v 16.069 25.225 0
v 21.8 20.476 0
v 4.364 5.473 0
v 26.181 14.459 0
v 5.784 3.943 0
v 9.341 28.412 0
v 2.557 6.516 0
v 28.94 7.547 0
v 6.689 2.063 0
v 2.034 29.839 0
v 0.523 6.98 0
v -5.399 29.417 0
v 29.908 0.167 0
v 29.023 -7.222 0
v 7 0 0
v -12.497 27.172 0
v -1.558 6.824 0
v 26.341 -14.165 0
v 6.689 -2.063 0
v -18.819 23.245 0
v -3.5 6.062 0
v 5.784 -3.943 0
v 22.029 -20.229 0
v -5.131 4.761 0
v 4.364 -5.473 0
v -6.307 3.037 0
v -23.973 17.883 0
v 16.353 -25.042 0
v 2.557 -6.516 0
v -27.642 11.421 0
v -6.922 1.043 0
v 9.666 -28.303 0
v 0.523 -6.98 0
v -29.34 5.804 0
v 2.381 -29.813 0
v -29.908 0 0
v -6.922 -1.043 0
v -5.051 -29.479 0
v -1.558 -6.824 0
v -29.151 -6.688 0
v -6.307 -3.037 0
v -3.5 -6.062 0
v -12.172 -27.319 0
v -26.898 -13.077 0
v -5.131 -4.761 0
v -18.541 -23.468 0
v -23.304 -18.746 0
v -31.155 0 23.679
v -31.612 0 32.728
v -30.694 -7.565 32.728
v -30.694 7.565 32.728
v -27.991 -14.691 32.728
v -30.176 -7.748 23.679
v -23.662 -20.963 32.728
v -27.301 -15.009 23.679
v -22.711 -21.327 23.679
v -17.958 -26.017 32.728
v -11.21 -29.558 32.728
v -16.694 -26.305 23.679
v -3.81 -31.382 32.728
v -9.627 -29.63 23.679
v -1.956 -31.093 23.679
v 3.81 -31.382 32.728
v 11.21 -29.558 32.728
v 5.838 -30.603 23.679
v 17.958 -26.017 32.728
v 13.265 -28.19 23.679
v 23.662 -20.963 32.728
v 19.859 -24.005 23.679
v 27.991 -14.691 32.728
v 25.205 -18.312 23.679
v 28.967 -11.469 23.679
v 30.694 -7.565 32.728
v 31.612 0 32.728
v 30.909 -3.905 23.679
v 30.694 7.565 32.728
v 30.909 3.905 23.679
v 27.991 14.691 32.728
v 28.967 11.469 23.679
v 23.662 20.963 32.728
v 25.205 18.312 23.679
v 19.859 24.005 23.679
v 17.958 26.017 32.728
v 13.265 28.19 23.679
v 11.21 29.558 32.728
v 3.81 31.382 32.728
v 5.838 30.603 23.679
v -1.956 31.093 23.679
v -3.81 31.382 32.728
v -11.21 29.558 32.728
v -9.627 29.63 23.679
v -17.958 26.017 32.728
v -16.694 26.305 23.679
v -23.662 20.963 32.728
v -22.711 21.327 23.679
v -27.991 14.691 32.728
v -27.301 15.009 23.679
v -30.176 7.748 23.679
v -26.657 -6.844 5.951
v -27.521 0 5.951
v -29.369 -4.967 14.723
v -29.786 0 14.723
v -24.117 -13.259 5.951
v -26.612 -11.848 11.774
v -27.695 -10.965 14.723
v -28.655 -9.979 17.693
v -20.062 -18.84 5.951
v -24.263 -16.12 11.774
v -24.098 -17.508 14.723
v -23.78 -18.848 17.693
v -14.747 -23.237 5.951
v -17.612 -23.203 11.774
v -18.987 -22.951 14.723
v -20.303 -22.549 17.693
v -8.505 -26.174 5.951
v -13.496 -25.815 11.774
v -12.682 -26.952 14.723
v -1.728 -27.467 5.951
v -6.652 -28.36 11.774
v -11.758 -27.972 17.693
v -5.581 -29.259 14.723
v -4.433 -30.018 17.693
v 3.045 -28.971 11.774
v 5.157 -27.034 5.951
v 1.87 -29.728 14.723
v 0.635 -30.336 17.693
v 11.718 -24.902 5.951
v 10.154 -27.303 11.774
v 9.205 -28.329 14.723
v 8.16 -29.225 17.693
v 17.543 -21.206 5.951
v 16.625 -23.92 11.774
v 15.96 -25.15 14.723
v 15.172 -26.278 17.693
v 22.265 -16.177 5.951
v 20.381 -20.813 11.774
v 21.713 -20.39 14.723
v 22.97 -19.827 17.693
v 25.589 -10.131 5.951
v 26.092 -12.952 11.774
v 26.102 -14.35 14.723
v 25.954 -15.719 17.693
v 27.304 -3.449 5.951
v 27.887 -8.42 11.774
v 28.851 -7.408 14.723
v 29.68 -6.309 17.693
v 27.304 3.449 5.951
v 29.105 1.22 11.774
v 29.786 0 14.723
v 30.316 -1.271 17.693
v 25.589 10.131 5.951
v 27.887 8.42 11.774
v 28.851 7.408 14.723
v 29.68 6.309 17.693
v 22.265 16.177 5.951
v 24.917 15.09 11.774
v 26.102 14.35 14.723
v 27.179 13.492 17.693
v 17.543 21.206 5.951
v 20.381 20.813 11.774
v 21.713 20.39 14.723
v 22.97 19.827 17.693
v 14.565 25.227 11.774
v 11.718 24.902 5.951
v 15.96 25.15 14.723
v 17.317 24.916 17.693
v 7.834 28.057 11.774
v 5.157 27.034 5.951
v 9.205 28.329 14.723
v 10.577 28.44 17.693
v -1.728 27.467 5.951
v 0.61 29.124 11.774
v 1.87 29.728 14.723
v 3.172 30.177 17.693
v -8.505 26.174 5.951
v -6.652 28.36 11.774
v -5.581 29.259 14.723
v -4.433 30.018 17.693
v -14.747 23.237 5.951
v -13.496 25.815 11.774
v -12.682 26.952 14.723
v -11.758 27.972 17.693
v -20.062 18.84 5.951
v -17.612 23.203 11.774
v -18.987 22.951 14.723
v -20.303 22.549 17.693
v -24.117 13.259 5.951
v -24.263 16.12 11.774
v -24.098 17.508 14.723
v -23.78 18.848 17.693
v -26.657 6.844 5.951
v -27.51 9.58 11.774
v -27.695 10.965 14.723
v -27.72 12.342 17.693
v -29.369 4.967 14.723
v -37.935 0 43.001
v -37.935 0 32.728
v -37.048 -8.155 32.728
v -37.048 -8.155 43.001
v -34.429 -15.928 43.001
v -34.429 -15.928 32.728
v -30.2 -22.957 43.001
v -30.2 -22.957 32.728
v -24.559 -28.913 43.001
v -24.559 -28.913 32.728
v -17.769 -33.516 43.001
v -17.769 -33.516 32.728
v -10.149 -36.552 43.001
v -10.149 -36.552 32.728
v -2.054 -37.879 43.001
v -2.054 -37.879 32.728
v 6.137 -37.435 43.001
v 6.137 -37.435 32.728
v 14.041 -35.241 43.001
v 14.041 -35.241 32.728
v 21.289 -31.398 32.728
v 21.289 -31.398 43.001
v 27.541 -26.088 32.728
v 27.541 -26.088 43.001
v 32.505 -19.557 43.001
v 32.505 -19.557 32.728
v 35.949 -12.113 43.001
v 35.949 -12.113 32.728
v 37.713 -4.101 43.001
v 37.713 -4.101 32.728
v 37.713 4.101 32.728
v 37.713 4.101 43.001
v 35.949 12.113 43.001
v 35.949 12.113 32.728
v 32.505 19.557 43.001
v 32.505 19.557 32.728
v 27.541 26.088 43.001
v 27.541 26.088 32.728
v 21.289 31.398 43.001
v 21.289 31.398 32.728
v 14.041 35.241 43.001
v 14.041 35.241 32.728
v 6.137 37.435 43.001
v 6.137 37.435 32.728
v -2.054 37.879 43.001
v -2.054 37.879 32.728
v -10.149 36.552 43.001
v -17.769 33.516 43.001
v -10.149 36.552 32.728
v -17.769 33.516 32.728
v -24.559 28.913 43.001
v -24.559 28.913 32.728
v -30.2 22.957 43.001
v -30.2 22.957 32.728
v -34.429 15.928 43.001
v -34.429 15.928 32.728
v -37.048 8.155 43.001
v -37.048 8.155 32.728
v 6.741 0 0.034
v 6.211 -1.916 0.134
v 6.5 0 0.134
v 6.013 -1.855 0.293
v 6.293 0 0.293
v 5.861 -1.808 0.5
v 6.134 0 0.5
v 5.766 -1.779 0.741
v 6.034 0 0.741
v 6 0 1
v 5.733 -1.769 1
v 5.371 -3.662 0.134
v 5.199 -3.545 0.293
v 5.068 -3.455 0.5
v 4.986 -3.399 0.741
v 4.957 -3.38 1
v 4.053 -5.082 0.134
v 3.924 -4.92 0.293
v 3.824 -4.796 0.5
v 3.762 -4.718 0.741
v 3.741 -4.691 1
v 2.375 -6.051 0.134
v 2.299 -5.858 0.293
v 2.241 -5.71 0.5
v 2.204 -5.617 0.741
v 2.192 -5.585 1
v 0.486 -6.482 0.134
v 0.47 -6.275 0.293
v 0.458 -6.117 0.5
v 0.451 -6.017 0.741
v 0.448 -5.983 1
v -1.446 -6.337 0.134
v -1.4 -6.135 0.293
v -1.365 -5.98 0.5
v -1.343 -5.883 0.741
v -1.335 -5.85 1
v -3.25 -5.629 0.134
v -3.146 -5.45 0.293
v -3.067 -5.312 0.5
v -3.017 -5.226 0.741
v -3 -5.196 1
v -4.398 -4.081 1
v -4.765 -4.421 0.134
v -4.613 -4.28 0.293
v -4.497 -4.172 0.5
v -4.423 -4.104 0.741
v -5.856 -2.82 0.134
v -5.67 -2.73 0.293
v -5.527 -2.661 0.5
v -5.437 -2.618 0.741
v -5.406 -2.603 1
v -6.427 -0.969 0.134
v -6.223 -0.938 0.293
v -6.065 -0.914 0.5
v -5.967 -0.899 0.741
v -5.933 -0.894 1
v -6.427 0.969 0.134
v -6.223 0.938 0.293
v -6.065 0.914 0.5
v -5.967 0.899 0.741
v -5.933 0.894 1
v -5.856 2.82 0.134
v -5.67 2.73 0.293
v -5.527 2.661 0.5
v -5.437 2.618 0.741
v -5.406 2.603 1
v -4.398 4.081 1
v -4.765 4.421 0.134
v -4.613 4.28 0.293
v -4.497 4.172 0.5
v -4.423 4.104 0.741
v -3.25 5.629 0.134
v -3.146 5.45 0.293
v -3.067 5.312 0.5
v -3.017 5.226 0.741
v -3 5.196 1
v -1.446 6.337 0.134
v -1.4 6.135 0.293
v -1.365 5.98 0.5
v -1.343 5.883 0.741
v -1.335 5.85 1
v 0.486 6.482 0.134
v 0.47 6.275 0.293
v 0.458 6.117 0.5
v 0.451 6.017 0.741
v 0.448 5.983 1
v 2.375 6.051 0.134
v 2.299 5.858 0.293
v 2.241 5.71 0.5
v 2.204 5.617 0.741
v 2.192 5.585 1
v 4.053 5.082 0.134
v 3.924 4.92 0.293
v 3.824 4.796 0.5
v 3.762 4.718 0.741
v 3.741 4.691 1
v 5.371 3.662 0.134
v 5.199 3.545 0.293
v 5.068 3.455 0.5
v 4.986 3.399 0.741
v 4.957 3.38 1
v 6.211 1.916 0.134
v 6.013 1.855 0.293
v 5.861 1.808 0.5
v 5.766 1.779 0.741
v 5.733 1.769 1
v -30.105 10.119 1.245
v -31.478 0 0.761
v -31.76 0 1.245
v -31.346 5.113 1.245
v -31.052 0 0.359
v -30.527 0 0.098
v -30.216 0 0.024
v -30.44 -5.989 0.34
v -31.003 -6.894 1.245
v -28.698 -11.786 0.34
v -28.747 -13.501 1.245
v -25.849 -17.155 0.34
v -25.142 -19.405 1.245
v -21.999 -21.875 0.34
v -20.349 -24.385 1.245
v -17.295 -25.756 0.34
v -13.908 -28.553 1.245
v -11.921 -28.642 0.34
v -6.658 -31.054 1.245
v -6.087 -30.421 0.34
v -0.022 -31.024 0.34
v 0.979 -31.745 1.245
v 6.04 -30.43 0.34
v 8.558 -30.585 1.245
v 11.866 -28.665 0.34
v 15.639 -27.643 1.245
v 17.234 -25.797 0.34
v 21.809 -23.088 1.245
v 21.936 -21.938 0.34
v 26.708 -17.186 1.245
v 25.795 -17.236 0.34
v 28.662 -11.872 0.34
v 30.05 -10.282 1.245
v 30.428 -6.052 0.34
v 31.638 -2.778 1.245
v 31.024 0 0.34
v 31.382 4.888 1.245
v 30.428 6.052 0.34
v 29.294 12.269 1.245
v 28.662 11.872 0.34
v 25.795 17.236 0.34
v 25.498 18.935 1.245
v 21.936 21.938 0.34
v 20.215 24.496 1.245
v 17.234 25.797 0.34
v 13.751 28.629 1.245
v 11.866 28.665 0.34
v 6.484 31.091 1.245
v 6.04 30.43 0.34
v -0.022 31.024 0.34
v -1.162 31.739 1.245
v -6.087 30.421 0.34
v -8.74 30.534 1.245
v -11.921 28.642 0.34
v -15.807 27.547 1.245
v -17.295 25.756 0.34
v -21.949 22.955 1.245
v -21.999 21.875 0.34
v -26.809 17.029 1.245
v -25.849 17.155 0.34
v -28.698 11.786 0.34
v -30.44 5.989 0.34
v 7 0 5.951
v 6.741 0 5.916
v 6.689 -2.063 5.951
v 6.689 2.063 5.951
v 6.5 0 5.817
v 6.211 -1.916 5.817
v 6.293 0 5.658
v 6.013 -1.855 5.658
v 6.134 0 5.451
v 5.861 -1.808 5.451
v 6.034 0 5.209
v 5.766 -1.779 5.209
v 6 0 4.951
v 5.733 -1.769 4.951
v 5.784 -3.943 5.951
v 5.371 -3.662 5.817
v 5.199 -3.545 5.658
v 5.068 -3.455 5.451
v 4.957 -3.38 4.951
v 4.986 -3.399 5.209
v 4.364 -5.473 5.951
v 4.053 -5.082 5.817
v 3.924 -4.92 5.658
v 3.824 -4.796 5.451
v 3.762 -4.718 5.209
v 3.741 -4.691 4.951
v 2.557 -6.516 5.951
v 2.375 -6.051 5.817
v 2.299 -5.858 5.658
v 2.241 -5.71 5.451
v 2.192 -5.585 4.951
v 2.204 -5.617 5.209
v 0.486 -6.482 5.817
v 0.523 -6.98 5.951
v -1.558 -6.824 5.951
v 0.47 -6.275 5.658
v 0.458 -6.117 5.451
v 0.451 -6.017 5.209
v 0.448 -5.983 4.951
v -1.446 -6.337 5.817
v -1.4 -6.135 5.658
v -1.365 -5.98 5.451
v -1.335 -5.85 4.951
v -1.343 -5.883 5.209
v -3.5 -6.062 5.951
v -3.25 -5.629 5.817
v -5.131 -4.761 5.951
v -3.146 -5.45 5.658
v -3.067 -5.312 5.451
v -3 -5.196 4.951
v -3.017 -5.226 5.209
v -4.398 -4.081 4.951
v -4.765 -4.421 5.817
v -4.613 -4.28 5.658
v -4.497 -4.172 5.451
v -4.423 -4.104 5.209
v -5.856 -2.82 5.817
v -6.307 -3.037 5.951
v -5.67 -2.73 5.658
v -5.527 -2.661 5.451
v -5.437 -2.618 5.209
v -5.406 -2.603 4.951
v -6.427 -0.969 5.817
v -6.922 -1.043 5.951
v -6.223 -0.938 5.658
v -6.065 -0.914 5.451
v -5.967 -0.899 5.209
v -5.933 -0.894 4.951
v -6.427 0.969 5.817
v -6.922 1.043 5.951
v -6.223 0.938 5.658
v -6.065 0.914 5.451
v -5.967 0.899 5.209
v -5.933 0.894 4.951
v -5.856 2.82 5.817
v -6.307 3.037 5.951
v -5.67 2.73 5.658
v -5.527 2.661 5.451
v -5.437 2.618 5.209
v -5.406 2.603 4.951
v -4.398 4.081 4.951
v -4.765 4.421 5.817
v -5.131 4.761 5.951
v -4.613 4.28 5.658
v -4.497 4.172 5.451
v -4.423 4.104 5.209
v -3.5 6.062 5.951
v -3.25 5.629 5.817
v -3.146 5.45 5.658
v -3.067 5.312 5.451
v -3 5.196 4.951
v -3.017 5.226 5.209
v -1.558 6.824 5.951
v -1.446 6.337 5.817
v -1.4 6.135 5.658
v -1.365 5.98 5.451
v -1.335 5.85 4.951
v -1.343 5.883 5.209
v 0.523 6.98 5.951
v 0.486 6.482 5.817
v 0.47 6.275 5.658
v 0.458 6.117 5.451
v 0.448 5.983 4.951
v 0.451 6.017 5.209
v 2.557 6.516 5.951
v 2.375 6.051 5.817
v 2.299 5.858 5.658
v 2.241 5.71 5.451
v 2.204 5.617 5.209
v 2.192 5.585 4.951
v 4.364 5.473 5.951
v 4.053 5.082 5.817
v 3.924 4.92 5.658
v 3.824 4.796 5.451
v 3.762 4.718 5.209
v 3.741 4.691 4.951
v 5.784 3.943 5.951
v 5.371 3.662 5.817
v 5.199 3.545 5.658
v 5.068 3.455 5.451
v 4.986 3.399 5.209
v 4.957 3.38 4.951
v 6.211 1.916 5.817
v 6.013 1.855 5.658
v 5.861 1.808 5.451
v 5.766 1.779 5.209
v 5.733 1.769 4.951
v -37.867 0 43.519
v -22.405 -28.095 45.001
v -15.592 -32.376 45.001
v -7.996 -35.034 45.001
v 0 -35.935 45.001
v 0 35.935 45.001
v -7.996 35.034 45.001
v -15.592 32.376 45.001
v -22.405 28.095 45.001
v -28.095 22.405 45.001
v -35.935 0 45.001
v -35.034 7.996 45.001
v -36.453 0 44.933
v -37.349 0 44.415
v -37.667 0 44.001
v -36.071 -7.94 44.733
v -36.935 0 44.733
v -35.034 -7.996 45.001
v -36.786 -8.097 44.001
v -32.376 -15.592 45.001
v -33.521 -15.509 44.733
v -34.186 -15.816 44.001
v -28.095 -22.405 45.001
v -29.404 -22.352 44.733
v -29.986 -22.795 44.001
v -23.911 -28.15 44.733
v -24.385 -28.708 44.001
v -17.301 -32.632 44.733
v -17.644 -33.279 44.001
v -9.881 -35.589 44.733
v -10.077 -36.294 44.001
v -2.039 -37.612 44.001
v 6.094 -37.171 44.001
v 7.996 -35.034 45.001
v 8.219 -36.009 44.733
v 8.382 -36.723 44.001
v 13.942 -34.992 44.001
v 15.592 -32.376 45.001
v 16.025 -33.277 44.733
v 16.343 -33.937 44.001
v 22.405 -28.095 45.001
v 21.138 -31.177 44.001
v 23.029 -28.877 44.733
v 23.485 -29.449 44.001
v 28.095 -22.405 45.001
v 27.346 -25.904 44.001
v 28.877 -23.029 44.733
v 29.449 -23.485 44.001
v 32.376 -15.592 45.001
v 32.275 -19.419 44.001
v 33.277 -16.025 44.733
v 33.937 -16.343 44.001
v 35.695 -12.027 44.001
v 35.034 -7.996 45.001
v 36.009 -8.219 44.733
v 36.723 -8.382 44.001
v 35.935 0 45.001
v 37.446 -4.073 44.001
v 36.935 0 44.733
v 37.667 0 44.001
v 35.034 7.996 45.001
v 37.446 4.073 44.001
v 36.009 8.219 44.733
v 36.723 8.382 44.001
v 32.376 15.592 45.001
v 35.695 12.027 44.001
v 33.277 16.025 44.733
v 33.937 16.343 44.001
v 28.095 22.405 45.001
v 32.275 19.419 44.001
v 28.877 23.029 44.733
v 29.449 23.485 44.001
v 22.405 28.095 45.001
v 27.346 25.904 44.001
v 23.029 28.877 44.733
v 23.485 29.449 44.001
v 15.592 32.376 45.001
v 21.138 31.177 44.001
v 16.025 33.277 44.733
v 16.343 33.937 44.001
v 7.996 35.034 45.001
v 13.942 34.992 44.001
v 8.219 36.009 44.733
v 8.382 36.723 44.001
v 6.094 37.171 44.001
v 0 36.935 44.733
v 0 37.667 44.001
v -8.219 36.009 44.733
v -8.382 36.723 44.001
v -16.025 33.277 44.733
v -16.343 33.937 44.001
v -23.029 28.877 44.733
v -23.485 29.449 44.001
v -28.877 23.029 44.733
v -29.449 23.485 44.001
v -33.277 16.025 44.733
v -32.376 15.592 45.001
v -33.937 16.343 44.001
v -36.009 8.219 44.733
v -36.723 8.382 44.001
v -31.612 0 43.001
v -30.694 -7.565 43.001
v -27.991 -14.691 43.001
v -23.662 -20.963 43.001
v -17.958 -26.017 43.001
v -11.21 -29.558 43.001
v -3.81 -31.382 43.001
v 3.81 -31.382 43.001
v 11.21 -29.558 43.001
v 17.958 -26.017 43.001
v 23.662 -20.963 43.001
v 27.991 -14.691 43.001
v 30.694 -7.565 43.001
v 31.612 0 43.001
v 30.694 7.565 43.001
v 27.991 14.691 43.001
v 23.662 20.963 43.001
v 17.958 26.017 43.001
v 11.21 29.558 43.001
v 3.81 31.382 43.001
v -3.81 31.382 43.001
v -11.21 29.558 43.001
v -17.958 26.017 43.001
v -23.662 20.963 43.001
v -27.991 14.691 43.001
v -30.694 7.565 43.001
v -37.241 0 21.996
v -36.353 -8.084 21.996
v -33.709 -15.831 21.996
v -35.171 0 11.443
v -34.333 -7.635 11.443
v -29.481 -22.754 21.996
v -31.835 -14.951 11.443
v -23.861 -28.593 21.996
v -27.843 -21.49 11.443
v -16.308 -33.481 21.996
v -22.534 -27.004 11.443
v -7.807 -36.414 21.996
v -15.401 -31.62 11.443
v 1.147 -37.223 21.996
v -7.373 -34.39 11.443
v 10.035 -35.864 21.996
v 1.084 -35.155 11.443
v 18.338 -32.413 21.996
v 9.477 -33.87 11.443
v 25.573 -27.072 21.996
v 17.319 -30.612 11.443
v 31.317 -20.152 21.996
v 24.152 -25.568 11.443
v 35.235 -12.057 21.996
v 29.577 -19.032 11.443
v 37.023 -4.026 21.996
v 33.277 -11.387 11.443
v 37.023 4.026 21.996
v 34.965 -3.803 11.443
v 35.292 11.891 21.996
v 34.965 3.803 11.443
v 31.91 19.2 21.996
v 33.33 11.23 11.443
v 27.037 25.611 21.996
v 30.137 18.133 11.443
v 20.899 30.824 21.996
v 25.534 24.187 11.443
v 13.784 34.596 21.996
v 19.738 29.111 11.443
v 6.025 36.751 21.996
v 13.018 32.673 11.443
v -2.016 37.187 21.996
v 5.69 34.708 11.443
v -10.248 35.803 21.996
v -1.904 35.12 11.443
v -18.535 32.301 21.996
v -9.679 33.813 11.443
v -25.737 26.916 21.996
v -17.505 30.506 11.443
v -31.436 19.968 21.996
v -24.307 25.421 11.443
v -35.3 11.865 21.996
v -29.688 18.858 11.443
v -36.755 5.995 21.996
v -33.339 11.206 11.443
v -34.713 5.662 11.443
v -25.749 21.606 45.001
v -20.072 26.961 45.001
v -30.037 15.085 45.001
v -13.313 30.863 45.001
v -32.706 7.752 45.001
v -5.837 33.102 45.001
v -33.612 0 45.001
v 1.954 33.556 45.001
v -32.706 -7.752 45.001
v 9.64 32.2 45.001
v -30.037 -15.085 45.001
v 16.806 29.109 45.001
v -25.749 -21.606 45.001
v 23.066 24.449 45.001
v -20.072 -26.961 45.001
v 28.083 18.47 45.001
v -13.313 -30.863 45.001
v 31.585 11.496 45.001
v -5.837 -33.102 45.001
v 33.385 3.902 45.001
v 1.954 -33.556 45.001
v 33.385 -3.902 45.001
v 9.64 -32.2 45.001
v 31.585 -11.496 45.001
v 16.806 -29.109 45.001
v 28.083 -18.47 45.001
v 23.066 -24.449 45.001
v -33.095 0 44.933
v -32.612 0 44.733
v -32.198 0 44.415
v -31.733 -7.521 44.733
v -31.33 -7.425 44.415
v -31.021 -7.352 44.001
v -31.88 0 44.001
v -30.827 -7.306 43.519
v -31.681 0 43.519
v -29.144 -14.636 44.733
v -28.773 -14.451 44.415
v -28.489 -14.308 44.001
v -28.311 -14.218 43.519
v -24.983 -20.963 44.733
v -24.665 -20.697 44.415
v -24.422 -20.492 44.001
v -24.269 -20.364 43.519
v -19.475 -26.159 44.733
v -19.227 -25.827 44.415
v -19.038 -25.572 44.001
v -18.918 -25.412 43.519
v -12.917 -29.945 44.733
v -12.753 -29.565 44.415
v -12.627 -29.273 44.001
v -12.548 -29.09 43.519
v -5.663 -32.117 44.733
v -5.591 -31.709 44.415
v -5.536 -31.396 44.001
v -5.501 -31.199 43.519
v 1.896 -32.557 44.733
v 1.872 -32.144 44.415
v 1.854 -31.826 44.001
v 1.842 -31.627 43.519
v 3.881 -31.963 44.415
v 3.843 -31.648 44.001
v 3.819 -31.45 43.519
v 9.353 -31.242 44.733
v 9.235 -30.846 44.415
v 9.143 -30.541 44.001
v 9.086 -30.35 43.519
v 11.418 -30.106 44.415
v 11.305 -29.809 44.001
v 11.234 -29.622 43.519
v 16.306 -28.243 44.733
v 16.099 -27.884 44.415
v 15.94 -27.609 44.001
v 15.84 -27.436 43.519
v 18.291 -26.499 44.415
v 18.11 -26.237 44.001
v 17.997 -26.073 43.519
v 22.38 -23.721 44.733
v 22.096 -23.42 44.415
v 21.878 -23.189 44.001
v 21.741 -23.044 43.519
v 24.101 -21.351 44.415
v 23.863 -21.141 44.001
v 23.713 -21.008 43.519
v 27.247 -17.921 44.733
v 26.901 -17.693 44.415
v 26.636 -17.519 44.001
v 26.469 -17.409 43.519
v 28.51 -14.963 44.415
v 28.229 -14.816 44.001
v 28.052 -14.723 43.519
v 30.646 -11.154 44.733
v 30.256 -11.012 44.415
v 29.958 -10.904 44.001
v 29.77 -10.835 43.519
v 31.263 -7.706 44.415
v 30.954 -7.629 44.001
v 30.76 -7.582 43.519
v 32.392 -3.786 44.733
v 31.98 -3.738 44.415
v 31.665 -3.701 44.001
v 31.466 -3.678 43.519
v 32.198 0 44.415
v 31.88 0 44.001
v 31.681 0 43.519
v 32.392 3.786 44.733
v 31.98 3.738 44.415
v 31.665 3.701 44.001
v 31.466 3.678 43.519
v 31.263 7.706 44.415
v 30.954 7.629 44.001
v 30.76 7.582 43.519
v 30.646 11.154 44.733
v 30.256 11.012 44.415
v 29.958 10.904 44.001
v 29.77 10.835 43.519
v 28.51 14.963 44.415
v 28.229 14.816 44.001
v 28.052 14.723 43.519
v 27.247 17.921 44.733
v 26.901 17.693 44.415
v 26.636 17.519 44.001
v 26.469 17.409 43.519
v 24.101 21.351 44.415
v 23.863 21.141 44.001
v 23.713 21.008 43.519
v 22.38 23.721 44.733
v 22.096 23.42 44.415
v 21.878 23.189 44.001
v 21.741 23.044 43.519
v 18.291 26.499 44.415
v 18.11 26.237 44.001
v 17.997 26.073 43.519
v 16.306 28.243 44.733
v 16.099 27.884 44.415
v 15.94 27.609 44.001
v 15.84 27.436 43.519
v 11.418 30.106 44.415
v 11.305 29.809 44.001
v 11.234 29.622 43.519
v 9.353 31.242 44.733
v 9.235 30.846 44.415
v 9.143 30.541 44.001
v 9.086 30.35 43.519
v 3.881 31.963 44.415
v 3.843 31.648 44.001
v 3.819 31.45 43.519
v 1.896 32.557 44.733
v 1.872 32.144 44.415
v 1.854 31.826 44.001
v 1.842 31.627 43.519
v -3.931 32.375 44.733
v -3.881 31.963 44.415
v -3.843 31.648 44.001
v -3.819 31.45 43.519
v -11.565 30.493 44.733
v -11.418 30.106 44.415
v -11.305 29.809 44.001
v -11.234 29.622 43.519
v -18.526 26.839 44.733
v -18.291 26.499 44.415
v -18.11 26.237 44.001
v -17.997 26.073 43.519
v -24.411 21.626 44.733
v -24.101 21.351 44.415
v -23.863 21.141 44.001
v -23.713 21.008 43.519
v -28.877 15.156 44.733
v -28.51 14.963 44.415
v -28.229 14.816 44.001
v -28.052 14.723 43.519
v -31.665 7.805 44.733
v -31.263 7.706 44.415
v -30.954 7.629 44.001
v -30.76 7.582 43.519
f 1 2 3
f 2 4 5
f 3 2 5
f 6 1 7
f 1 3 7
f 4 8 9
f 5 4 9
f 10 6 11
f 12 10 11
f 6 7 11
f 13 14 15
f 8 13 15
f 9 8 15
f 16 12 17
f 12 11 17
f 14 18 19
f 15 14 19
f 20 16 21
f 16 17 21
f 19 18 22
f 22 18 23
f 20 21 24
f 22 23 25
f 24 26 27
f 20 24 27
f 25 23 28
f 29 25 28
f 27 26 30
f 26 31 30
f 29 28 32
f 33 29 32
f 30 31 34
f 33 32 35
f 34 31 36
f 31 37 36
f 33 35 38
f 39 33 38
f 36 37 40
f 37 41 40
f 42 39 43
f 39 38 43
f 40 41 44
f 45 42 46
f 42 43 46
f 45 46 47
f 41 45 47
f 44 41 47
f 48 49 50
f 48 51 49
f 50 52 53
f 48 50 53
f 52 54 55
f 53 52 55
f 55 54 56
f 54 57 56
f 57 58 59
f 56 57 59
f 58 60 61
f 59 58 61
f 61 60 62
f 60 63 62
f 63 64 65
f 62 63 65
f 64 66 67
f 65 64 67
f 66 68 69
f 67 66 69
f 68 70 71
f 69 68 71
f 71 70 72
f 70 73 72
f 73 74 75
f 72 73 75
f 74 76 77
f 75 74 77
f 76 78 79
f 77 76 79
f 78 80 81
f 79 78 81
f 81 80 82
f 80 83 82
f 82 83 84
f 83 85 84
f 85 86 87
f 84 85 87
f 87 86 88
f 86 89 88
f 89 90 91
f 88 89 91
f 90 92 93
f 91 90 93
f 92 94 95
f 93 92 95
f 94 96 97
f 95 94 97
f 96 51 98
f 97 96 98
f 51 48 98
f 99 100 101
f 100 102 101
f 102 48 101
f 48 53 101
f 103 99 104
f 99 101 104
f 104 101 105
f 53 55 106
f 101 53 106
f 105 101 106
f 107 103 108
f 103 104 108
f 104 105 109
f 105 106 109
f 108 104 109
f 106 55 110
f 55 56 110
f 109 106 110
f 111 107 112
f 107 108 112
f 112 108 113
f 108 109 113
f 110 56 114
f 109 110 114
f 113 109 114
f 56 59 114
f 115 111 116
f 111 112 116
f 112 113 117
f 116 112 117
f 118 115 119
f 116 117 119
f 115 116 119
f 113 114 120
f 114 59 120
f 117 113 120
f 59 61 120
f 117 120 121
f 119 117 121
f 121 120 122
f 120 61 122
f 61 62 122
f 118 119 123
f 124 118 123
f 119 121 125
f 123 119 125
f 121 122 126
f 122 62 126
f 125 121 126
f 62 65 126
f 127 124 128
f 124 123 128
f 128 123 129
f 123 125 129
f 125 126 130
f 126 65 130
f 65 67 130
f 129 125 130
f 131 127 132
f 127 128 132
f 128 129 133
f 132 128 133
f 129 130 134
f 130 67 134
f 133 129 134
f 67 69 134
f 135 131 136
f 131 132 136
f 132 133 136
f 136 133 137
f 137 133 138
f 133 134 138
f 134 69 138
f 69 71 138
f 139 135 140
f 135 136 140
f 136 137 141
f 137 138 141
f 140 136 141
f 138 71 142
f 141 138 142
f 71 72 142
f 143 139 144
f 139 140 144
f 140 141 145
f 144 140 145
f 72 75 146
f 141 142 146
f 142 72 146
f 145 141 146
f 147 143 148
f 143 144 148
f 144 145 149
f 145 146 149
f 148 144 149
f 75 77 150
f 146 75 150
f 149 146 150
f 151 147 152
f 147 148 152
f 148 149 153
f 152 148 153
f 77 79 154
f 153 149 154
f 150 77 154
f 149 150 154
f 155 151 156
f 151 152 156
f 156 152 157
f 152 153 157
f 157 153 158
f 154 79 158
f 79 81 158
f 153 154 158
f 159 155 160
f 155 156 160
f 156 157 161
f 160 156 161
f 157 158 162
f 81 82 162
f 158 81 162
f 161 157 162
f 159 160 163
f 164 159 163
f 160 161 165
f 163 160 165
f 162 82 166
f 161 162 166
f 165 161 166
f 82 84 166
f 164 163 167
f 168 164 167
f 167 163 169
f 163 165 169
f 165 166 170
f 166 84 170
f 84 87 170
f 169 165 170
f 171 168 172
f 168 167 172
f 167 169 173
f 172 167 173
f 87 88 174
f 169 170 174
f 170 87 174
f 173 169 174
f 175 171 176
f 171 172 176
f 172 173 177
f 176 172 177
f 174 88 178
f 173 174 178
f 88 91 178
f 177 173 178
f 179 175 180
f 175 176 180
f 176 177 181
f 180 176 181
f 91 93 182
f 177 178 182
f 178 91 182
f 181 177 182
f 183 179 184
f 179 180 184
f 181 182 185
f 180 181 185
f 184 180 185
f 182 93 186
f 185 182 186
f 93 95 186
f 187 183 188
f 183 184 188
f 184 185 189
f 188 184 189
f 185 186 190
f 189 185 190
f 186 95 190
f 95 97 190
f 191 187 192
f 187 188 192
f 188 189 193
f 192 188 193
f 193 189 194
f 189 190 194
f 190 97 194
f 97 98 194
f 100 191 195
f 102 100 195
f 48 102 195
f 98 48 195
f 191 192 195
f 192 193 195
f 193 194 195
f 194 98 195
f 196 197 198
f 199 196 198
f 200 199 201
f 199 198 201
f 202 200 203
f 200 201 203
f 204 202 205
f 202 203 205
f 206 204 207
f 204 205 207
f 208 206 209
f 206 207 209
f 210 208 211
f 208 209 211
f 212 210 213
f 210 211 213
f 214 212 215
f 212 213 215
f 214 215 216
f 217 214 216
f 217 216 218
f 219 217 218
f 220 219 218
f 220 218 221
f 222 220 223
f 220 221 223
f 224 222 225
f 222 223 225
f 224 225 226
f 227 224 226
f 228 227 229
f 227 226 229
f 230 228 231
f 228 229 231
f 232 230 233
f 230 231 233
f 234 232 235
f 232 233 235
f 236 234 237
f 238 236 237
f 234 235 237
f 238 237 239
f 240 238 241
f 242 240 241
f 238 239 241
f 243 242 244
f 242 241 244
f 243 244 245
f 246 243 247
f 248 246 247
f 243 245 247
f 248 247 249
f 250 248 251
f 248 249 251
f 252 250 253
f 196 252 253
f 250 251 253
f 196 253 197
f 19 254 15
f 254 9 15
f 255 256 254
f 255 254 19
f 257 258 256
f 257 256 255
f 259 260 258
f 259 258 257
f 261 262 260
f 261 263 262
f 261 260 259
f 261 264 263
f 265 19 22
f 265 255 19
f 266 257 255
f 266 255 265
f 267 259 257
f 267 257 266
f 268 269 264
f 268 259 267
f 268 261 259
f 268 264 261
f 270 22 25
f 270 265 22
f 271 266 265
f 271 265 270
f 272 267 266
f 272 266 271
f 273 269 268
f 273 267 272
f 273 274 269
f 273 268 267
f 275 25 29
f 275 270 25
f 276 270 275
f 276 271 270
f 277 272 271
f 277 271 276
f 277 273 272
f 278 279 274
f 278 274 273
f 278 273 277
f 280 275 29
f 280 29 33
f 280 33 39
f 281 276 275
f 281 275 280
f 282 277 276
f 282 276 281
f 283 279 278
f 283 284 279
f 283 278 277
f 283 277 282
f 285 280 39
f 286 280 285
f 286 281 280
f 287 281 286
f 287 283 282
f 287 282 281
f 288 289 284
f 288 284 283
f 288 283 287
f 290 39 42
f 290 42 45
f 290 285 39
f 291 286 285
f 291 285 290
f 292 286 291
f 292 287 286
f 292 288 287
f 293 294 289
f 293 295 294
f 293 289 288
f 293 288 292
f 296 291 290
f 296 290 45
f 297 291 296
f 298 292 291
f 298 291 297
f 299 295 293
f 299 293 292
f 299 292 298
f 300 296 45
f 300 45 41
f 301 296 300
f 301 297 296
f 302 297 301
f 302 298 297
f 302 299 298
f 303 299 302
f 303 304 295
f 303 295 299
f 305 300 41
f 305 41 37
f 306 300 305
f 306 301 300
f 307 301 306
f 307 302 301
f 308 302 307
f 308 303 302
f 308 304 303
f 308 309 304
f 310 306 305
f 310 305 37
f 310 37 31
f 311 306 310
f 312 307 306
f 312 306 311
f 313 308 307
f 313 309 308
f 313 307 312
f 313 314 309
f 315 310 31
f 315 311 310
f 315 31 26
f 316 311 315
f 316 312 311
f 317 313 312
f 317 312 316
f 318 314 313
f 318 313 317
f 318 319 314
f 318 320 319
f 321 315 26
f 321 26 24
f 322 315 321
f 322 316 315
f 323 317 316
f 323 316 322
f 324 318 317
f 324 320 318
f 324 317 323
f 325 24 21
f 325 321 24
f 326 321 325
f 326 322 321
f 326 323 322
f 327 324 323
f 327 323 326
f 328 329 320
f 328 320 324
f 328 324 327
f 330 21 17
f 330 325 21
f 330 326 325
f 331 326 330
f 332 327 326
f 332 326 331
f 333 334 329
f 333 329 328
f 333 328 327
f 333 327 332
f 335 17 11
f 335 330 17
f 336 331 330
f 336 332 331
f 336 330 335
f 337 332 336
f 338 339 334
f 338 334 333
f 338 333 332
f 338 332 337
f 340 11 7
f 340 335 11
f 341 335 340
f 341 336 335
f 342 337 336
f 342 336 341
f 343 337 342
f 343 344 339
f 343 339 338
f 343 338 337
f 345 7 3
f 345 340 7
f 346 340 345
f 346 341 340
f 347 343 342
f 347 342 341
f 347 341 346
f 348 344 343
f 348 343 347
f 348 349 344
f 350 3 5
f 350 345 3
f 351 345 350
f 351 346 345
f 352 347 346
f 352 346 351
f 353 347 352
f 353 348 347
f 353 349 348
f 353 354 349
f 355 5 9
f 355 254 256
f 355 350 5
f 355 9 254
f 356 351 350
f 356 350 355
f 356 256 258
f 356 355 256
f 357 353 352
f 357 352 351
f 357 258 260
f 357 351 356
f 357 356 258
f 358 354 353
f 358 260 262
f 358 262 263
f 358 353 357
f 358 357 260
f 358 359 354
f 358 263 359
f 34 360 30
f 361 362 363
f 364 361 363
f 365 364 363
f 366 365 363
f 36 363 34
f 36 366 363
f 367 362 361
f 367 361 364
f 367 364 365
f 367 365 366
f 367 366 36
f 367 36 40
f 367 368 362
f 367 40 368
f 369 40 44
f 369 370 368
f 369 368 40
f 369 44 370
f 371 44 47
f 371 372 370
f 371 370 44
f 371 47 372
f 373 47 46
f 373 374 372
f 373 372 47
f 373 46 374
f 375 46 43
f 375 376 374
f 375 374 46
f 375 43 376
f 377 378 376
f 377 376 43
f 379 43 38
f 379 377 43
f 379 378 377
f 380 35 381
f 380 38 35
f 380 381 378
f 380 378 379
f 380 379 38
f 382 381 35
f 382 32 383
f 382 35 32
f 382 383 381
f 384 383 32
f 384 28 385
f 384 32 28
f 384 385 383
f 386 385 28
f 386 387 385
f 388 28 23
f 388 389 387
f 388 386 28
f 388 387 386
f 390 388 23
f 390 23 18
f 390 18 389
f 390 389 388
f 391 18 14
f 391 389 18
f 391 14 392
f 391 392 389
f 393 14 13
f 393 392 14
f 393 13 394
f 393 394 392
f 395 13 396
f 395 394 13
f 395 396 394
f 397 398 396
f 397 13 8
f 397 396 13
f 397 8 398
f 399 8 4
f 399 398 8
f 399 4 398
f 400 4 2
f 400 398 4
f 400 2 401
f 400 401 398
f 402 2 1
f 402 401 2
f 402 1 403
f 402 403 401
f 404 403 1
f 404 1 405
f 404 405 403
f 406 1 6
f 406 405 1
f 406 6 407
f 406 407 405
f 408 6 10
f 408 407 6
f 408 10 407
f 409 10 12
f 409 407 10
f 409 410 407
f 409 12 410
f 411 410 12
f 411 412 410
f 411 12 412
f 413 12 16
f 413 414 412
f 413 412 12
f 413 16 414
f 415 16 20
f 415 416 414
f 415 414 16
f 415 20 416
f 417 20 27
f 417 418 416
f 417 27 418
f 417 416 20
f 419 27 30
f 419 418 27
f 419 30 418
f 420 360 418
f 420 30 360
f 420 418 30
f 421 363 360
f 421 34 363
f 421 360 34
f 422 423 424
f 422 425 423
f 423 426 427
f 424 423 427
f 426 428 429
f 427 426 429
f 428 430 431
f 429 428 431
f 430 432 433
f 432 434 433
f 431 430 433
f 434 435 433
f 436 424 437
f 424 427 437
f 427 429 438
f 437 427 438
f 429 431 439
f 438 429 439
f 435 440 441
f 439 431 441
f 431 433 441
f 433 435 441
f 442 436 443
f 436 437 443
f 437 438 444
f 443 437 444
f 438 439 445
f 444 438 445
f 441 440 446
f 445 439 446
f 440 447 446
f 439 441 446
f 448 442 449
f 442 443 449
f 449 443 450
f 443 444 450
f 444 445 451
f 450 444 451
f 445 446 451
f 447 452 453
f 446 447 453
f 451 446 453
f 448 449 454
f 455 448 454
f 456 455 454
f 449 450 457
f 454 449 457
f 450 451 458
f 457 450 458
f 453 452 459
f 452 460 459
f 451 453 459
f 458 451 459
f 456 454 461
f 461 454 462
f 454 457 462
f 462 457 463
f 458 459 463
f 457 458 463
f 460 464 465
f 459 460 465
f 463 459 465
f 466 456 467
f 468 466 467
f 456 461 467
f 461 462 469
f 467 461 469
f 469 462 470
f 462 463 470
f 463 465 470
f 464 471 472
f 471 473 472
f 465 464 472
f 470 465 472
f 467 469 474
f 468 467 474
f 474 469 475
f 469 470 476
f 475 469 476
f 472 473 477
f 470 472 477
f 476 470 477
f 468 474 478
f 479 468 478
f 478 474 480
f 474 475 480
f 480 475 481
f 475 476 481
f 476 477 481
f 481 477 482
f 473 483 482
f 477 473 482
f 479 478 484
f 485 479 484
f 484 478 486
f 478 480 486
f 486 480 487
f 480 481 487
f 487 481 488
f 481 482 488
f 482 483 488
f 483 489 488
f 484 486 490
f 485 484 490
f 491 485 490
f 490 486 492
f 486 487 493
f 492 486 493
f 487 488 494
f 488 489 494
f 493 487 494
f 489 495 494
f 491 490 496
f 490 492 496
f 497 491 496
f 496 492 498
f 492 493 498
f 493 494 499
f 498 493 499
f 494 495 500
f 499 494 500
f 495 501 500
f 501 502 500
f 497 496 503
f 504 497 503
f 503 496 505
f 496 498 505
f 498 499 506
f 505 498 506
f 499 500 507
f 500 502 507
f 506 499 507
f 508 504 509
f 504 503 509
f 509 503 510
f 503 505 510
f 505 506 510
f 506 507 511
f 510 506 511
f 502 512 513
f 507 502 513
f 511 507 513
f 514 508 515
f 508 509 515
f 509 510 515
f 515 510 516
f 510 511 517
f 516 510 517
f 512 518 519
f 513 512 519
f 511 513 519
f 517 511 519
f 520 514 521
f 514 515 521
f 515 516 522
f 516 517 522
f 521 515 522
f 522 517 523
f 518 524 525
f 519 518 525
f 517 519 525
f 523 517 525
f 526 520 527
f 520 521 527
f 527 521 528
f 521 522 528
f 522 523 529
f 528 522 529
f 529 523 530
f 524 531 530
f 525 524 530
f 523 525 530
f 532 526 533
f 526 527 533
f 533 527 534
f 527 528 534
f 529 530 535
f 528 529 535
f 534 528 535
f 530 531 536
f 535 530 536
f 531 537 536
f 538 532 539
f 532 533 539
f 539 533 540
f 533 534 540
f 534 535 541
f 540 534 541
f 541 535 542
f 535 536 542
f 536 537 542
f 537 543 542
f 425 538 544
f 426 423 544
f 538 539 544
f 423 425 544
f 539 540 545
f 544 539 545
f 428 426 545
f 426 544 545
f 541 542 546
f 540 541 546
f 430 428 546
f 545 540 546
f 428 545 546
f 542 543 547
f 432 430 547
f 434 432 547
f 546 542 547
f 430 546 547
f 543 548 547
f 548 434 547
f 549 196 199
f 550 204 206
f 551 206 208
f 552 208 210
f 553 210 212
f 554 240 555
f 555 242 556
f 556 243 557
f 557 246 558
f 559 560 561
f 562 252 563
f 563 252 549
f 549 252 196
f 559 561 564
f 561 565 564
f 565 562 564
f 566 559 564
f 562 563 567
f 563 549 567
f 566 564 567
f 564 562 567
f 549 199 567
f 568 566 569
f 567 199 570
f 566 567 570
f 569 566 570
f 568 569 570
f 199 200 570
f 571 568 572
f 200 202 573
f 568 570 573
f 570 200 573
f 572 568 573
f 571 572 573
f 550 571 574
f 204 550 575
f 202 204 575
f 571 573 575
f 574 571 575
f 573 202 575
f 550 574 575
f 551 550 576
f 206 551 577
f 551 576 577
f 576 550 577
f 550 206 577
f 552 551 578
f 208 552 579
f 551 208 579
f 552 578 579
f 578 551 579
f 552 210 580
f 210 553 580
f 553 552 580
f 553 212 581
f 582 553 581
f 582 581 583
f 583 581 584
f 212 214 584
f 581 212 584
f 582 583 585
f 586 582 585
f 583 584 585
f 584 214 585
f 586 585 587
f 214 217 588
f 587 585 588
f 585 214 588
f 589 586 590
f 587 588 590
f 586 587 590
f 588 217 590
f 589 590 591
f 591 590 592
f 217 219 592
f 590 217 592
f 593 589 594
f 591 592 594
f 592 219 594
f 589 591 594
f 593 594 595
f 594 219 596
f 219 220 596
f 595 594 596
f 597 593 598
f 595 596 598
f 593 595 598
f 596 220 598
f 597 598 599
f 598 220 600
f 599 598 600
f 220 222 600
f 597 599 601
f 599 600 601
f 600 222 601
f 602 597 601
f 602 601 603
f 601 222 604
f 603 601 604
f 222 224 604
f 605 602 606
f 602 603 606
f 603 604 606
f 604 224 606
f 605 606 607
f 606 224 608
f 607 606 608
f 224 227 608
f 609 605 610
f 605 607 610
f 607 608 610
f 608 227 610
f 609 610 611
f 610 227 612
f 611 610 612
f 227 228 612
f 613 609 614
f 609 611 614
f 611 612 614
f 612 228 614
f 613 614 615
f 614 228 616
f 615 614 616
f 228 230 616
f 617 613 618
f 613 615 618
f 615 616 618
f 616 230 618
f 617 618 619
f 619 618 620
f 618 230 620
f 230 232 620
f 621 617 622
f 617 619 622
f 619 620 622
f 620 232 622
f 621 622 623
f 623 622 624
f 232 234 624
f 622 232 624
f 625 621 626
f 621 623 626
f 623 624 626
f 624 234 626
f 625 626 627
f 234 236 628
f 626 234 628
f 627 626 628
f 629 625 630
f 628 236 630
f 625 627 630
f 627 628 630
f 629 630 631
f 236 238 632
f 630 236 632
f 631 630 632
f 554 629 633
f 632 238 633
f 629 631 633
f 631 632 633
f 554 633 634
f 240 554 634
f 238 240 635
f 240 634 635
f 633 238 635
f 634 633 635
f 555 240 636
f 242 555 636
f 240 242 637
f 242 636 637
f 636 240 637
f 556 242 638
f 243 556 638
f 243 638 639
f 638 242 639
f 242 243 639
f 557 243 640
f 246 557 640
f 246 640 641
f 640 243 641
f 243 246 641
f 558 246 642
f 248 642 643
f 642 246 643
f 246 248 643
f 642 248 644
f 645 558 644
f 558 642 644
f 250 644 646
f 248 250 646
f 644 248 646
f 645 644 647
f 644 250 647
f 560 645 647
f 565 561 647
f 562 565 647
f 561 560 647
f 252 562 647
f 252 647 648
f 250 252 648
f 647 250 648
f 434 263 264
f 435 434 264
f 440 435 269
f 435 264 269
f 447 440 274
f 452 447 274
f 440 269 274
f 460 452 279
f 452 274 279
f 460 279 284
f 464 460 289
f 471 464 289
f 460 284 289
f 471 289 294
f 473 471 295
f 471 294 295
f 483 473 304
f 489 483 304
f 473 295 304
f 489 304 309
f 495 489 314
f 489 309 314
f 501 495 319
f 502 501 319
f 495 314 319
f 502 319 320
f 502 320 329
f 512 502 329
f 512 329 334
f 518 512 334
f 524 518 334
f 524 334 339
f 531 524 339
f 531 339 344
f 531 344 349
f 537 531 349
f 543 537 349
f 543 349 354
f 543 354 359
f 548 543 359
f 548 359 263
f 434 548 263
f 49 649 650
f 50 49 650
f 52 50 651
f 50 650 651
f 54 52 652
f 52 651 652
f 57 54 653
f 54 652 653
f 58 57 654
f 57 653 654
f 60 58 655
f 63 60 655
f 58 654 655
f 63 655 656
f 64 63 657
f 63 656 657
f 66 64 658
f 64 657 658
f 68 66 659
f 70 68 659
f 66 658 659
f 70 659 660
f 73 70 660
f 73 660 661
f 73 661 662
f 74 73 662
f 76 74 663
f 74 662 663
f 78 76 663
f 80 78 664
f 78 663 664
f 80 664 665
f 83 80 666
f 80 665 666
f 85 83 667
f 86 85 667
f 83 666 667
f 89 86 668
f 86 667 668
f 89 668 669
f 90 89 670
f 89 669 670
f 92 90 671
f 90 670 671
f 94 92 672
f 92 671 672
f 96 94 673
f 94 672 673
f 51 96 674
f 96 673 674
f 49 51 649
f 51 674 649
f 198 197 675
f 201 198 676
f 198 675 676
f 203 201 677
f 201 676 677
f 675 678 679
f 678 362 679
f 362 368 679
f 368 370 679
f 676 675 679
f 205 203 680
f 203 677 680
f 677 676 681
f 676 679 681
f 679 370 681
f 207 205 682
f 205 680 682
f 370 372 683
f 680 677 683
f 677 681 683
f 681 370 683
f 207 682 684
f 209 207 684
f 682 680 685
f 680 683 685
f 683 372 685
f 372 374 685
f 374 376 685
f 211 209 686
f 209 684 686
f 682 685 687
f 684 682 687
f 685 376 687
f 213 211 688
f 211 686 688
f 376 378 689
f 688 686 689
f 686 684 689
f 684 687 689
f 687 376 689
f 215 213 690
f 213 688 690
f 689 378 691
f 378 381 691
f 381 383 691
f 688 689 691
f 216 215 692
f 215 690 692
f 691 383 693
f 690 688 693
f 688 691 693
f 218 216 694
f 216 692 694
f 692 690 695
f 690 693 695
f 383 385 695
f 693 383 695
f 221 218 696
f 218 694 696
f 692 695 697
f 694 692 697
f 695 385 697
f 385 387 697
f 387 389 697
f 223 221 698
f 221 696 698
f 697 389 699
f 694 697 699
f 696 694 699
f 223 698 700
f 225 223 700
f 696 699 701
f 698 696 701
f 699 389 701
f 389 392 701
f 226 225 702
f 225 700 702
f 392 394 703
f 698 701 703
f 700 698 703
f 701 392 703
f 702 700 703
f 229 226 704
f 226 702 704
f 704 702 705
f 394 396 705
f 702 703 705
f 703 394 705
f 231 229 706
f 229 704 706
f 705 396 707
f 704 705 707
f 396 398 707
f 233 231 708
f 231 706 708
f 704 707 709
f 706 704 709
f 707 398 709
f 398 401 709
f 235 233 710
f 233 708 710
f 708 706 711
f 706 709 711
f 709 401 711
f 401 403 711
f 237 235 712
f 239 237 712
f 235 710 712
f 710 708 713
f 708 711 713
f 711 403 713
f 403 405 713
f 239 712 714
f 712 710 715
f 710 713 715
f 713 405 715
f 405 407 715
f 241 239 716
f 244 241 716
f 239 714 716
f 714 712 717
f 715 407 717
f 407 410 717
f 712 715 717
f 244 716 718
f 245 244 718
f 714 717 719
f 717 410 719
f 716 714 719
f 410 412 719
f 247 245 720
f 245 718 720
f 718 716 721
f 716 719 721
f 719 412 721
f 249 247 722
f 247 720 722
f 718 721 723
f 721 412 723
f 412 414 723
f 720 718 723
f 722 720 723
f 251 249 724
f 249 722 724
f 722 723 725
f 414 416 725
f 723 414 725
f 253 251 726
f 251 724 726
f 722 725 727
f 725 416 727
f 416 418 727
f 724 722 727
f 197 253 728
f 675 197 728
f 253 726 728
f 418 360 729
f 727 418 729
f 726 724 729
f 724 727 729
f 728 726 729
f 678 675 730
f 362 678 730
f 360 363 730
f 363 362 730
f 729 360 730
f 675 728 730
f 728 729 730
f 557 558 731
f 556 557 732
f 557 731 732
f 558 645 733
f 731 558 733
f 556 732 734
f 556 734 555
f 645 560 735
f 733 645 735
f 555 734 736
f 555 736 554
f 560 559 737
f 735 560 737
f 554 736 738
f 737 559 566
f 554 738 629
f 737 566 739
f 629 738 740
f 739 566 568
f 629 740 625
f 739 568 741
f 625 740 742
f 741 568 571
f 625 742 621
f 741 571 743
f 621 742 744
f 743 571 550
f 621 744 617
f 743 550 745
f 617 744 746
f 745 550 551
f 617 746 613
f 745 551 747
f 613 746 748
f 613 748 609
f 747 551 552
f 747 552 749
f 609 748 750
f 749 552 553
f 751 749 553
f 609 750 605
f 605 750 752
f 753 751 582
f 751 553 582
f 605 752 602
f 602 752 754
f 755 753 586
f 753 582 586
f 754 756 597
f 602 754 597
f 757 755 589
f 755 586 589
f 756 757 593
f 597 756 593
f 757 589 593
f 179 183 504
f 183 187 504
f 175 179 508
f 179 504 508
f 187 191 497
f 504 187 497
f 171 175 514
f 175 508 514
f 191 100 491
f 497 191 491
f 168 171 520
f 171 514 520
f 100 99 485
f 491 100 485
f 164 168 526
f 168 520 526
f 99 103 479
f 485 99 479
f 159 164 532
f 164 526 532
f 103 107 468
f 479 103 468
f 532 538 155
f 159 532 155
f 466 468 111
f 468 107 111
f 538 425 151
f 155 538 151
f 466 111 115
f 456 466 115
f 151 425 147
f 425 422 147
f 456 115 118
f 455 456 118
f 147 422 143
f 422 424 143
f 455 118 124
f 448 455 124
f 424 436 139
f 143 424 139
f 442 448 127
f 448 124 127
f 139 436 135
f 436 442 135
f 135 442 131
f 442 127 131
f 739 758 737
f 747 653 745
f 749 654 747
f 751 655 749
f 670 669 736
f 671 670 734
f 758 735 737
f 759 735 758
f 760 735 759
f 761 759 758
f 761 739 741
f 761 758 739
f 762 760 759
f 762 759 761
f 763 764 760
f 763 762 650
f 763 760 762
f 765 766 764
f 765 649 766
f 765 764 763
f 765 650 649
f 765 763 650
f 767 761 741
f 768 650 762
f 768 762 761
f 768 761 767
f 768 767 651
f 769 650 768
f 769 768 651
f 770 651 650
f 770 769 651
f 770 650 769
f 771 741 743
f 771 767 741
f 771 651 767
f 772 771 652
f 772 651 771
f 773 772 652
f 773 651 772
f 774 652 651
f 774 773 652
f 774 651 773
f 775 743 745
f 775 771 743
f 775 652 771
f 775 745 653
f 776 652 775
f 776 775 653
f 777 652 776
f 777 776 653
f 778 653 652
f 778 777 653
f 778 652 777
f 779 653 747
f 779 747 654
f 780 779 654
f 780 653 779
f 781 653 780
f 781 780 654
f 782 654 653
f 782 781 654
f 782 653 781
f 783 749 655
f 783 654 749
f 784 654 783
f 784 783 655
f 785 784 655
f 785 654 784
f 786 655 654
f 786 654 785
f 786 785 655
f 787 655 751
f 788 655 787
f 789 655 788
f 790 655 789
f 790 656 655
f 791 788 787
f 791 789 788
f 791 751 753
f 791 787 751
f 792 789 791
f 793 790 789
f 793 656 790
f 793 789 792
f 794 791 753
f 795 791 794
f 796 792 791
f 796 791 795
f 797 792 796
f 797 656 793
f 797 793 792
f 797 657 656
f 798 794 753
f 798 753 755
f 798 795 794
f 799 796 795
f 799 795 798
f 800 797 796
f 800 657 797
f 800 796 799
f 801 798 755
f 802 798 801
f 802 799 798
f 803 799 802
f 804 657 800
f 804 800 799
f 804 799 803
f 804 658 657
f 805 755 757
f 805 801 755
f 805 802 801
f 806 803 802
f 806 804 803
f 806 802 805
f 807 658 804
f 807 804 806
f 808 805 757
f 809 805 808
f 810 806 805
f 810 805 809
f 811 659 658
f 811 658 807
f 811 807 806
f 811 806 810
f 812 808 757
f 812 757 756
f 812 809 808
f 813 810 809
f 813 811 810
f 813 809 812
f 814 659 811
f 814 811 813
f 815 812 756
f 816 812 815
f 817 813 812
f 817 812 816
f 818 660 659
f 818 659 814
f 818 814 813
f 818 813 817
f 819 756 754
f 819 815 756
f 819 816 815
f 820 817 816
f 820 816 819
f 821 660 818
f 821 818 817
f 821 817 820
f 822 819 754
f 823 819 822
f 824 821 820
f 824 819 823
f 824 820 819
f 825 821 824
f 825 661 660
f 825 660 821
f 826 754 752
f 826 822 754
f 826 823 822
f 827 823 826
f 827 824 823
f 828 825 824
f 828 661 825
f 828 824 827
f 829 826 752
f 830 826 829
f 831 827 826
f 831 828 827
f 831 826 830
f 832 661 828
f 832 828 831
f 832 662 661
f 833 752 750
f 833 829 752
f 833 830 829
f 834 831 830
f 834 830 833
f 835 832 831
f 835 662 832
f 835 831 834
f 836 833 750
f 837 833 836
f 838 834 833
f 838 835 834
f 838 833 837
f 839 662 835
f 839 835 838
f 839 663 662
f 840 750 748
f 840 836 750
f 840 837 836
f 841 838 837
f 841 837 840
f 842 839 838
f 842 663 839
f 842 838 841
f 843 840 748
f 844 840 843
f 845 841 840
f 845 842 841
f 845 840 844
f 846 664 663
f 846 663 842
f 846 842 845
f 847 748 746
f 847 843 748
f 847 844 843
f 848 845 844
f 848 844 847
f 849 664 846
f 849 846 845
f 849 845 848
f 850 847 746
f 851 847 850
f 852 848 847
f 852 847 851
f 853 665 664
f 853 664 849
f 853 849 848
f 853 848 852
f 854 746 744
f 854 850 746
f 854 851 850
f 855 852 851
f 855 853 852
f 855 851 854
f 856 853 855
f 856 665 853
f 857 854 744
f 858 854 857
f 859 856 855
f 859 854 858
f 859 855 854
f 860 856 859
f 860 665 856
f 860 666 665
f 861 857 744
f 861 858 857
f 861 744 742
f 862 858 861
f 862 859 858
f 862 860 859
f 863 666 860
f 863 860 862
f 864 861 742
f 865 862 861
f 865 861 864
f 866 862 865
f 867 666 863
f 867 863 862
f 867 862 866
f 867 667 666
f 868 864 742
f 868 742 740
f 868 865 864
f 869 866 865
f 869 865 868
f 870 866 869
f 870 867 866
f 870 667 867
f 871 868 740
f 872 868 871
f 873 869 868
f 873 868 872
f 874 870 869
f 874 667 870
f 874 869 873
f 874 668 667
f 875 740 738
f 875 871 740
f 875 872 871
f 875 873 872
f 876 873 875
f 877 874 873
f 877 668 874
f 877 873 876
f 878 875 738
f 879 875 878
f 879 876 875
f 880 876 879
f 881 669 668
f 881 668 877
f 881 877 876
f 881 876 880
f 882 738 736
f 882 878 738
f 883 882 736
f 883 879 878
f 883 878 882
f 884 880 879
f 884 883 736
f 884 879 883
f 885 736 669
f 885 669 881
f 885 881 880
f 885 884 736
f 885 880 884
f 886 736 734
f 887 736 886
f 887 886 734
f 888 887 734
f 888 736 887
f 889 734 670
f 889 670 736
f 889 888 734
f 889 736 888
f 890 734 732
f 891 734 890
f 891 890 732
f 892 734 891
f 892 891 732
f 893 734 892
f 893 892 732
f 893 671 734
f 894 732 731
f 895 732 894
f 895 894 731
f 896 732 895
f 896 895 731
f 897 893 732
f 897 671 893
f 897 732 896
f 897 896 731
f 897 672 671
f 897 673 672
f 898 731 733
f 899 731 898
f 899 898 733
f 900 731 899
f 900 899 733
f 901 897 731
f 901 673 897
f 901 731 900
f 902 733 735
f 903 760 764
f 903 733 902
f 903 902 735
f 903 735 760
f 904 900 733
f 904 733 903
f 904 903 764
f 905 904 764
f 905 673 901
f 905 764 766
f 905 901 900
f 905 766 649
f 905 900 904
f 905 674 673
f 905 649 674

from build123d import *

# Parameters (mm, degrees)
F2_R     = 2
F3_R     = 2
F4_R     = 6
F5_DEPTH = 25
F6_R     = 1


with BuildPart() as f1:
    # F0 (on Front) → F1 (revolve)
    with BuildSketch(Plane.XZ):
        with BuildLine():
            Line((-31.612418592, 45.0012125075), (-37.9349030554, 45.0012125075))
            Line((-37.9349030554, 45.0012125075), (-37.9349030554, 32.7281542122))
            ThreePointArc((-37.9349030554, 32.7281542122), (-36.244155821, 16.0252577282), (-31.2405079603, 0))
            Line((-31.2405079603, 0), (0, 0))
            Line((0, 0), (0, 5.9505733661))
            Line((0, 5.9505733661), (-27.5213997811, 5.9505733661))
            ThreePointArc((-27.5213997811, 5.9505733661), (-30.5837644991, 19.1840109126), (-31.612418592, 32.7281542122))
            Line((-31.612418592, 32.7281542122), (-31.612418592, 45.0012125075))
        make_face()
    revolve(axis=Axis((0, 0, 2.9752866831), (0, 0, 1)))

    # F2
    f2_edges = [f1.edges().sort_by_distance(p)[0] for p in [
        (31.612419, 0, 45.001213),
    ]]
    fillet(f2_edges, radius=F2_R)

    # F3
    f3_edges = [f1.edges().sort_by_distance(p)[0] for p in [
        (37.934903, 0, 45.001213),
        (31.240508, 0, 0),
    ]]
    fillet(f3_edges, radius=F3_R)

    # F4 (on face) → F5 (cut)
    with BuildSketch(Plane(origin=(0, 0, 0), x_dir=(1, 0, 0), z_dir=(0, 0, -1))):
        Circle(F4_R)
    extrude(amount=-F5_DEPTH, mode=Mode.SUBTRACT)

    # F6
    f6_edges = [f1.edges().sort_by_distance(p)[0] for p in [
        (-6, 0, 0),
        (-6, 0, 5.950573),
    ]]
    fillet(f6_edges, radius=F6_R)


solid = f1.part
